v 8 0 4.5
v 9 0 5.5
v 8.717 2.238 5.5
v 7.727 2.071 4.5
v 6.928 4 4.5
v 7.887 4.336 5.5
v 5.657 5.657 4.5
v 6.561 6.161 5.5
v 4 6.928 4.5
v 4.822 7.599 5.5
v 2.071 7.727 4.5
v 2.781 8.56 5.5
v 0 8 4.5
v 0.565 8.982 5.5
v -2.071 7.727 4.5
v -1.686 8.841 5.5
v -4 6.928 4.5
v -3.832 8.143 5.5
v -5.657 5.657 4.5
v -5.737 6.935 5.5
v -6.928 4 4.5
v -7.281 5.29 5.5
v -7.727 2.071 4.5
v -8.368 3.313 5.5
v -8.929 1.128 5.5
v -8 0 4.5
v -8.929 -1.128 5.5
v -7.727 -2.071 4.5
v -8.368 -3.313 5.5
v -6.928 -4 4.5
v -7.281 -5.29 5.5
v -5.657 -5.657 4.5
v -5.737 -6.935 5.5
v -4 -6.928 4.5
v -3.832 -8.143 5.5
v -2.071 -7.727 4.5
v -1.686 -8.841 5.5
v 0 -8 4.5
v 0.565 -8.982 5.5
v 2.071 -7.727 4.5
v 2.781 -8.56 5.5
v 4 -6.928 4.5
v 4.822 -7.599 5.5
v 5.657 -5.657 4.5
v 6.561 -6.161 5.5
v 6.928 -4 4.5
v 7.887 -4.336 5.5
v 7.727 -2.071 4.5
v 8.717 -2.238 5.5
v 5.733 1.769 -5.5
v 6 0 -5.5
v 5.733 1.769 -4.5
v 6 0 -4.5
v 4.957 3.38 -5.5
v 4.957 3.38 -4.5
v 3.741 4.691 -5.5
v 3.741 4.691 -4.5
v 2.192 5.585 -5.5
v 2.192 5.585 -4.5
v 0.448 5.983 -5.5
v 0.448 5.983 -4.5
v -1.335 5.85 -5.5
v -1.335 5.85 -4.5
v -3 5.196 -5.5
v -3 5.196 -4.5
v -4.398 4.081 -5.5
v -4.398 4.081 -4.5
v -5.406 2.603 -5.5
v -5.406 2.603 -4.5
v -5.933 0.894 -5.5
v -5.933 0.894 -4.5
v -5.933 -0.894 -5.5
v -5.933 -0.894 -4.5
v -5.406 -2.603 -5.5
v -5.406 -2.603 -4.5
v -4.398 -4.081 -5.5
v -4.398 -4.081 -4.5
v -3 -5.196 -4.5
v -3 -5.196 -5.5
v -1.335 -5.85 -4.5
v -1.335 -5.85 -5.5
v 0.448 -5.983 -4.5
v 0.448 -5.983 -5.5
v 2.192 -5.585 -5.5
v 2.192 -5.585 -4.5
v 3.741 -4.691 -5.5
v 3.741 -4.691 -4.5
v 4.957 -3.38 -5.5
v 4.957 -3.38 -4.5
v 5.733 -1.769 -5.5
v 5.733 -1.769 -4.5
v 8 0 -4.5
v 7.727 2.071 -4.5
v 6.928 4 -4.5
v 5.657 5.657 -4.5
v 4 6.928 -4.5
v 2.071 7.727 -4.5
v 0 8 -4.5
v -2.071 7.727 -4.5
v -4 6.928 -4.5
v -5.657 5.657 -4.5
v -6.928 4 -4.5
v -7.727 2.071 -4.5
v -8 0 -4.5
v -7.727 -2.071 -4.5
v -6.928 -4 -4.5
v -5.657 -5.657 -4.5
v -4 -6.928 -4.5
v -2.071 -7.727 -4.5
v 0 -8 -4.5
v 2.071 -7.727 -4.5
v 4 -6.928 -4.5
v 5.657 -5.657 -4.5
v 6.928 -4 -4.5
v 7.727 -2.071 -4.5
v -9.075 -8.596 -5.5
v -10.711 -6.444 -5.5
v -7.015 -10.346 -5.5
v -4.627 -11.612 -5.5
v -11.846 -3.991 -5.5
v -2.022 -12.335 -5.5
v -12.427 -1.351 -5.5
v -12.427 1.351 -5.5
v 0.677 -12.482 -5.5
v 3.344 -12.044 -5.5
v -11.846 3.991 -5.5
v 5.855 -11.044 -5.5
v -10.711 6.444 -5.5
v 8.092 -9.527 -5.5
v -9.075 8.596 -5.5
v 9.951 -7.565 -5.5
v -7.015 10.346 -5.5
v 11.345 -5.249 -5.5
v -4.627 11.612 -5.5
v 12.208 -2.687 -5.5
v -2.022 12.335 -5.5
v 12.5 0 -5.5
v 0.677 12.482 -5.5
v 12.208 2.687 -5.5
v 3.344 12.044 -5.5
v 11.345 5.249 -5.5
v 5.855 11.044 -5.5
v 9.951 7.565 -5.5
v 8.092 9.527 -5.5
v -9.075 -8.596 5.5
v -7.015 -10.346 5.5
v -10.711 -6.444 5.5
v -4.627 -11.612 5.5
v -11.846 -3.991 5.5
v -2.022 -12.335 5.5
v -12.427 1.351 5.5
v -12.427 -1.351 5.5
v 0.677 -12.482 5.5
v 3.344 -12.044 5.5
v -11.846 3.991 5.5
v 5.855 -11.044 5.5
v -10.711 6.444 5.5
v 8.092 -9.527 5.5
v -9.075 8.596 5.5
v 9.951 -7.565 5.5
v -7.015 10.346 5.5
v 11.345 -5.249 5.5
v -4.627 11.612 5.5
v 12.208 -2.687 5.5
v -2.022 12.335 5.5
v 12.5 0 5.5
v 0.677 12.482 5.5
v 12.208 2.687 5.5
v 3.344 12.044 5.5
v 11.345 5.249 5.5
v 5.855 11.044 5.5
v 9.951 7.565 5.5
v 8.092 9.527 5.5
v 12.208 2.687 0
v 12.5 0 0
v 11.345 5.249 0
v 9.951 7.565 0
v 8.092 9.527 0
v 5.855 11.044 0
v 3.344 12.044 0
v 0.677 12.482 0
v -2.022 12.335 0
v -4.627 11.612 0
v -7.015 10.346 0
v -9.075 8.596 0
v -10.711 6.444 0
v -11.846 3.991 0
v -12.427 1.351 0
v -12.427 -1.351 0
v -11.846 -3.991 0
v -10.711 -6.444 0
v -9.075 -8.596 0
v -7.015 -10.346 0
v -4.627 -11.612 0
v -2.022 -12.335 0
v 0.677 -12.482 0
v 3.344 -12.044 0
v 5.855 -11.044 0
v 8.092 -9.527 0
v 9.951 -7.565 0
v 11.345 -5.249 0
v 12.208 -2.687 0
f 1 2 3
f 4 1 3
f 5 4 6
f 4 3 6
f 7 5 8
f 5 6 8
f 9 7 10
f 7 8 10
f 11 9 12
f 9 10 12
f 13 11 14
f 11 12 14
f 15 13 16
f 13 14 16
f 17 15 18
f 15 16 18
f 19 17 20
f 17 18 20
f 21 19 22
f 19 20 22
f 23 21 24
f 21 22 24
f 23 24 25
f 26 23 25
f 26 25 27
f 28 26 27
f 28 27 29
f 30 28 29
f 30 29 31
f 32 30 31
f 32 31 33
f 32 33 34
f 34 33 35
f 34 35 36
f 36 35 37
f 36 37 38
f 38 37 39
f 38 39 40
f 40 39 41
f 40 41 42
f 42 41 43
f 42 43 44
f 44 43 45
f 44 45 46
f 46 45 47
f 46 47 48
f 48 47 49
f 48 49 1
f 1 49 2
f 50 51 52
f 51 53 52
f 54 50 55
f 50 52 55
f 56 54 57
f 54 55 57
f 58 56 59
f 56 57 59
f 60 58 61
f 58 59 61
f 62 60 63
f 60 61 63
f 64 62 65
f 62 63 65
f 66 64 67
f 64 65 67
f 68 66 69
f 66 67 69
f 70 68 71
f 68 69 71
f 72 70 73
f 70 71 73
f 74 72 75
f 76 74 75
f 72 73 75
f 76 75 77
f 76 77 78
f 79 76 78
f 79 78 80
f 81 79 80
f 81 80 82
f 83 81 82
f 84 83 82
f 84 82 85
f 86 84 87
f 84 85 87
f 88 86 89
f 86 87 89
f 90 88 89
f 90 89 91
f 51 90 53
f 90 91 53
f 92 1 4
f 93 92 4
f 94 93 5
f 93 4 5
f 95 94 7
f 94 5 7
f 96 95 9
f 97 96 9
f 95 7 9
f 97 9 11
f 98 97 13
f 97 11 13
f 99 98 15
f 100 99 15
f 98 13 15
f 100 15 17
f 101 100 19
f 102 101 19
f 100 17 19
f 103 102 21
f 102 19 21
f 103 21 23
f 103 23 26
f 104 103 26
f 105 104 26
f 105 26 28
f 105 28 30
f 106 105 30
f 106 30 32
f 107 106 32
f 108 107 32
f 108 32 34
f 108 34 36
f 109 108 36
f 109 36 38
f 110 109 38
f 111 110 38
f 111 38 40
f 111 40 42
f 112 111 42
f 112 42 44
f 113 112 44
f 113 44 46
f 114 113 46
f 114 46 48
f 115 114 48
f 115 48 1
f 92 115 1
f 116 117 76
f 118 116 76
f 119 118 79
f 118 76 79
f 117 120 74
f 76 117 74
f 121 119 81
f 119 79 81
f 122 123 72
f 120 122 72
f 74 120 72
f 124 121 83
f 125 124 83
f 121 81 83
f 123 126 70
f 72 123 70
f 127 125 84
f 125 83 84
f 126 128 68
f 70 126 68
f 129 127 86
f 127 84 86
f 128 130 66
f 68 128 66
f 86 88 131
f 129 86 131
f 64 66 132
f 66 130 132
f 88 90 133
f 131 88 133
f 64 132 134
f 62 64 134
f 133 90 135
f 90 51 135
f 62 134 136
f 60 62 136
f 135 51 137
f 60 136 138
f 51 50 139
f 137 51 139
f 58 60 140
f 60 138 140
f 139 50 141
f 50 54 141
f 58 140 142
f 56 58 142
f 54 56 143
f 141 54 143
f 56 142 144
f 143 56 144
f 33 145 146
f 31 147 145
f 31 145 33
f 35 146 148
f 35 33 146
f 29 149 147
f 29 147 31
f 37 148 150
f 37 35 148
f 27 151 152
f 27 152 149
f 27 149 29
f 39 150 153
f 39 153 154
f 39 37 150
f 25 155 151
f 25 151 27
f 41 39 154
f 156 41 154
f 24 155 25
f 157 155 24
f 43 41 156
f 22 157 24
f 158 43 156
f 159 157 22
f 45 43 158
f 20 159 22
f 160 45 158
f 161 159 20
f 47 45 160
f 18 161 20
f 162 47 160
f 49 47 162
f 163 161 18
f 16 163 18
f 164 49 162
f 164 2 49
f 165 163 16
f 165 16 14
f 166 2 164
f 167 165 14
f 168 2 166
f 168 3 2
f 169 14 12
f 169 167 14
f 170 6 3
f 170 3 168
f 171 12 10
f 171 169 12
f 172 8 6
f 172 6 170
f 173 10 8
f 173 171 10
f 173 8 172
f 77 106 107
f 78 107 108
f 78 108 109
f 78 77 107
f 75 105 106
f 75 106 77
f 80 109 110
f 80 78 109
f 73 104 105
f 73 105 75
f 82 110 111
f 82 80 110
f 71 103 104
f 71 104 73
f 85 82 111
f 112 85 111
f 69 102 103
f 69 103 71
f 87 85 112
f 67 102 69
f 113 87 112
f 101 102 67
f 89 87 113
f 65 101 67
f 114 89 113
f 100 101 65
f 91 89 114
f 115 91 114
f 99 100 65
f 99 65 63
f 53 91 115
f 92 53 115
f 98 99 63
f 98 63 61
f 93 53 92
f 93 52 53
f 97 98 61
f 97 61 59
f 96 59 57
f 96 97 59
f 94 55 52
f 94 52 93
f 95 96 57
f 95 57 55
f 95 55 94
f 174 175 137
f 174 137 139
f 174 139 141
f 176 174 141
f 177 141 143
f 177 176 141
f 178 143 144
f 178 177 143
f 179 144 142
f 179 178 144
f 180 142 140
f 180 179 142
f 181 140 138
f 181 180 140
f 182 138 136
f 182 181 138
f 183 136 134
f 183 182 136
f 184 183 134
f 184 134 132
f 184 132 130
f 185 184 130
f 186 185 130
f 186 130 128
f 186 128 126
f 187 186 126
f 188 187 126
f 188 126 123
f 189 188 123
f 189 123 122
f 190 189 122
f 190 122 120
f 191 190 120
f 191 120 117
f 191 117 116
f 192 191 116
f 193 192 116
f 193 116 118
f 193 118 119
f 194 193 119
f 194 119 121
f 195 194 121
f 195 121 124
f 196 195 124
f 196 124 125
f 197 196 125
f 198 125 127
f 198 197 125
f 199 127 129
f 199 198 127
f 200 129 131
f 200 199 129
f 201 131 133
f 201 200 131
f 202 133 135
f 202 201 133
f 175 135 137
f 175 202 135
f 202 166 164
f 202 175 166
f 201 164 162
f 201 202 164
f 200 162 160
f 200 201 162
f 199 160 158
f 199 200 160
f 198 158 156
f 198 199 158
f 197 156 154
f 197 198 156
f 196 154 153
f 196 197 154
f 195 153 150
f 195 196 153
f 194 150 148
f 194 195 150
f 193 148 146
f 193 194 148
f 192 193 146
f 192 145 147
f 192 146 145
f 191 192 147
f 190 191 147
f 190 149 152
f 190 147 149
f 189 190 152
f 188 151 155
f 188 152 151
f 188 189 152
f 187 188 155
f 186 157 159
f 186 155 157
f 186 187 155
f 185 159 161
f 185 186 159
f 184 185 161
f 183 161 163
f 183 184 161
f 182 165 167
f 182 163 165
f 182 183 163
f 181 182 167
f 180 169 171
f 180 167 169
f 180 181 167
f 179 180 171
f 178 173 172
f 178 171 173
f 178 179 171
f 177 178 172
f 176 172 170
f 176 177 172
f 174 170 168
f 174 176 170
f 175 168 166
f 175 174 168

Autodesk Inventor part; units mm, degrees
ref_plane "YZ Plane" through (0, 0, 0) normal (1, 0, 0) x (0, 1, 0)
ref_plane "XZ Plane" through (0, 0, 0) normal (0, 1, 0) x (-1, 0, 0)
ref_plane "XY Plane" through (0, 0, 0) normal (0, 0, 1) x (1, 0, 0)
sketch "Szkic główny" plane through (0, 0, 0) normal (0, 0, 1) x (1, 0, 0)
  circle A0 centre (0, 0) radius 12.5
  dimension "d0" = 25
extrude "Koło pasowe" add sketch "Szkic główny" along normal mid plane 11
sketch "Szkic2" plane through (0, 0, 5.5) normal (0, 0, 1) x (1, 0, 0)
  circle A0 centre (0, 0) radius 8
  circle A1 centre (0, 0) radius 6
  dimension "d5" = 16
  dimension "d6" = 12
extrude "Wyciągnięcie proste2" cut sketch "Szkic2" against normal through all contours A1
extrude "Wyciągnięcie proste3" cut sketch "Szkic2" against normal blind 10
chamfer "Faza1" distance 1 angle 45 1 edges at (-8, 0, 5.5)
equation "\"d0\" = da_D"
equation "\"d1\" = da_B"
equation "\"da_D\" = 25"
equation "\"da_B\" = 11"
properties part number "Koło pasowe zwykłe1" material "Steel"
